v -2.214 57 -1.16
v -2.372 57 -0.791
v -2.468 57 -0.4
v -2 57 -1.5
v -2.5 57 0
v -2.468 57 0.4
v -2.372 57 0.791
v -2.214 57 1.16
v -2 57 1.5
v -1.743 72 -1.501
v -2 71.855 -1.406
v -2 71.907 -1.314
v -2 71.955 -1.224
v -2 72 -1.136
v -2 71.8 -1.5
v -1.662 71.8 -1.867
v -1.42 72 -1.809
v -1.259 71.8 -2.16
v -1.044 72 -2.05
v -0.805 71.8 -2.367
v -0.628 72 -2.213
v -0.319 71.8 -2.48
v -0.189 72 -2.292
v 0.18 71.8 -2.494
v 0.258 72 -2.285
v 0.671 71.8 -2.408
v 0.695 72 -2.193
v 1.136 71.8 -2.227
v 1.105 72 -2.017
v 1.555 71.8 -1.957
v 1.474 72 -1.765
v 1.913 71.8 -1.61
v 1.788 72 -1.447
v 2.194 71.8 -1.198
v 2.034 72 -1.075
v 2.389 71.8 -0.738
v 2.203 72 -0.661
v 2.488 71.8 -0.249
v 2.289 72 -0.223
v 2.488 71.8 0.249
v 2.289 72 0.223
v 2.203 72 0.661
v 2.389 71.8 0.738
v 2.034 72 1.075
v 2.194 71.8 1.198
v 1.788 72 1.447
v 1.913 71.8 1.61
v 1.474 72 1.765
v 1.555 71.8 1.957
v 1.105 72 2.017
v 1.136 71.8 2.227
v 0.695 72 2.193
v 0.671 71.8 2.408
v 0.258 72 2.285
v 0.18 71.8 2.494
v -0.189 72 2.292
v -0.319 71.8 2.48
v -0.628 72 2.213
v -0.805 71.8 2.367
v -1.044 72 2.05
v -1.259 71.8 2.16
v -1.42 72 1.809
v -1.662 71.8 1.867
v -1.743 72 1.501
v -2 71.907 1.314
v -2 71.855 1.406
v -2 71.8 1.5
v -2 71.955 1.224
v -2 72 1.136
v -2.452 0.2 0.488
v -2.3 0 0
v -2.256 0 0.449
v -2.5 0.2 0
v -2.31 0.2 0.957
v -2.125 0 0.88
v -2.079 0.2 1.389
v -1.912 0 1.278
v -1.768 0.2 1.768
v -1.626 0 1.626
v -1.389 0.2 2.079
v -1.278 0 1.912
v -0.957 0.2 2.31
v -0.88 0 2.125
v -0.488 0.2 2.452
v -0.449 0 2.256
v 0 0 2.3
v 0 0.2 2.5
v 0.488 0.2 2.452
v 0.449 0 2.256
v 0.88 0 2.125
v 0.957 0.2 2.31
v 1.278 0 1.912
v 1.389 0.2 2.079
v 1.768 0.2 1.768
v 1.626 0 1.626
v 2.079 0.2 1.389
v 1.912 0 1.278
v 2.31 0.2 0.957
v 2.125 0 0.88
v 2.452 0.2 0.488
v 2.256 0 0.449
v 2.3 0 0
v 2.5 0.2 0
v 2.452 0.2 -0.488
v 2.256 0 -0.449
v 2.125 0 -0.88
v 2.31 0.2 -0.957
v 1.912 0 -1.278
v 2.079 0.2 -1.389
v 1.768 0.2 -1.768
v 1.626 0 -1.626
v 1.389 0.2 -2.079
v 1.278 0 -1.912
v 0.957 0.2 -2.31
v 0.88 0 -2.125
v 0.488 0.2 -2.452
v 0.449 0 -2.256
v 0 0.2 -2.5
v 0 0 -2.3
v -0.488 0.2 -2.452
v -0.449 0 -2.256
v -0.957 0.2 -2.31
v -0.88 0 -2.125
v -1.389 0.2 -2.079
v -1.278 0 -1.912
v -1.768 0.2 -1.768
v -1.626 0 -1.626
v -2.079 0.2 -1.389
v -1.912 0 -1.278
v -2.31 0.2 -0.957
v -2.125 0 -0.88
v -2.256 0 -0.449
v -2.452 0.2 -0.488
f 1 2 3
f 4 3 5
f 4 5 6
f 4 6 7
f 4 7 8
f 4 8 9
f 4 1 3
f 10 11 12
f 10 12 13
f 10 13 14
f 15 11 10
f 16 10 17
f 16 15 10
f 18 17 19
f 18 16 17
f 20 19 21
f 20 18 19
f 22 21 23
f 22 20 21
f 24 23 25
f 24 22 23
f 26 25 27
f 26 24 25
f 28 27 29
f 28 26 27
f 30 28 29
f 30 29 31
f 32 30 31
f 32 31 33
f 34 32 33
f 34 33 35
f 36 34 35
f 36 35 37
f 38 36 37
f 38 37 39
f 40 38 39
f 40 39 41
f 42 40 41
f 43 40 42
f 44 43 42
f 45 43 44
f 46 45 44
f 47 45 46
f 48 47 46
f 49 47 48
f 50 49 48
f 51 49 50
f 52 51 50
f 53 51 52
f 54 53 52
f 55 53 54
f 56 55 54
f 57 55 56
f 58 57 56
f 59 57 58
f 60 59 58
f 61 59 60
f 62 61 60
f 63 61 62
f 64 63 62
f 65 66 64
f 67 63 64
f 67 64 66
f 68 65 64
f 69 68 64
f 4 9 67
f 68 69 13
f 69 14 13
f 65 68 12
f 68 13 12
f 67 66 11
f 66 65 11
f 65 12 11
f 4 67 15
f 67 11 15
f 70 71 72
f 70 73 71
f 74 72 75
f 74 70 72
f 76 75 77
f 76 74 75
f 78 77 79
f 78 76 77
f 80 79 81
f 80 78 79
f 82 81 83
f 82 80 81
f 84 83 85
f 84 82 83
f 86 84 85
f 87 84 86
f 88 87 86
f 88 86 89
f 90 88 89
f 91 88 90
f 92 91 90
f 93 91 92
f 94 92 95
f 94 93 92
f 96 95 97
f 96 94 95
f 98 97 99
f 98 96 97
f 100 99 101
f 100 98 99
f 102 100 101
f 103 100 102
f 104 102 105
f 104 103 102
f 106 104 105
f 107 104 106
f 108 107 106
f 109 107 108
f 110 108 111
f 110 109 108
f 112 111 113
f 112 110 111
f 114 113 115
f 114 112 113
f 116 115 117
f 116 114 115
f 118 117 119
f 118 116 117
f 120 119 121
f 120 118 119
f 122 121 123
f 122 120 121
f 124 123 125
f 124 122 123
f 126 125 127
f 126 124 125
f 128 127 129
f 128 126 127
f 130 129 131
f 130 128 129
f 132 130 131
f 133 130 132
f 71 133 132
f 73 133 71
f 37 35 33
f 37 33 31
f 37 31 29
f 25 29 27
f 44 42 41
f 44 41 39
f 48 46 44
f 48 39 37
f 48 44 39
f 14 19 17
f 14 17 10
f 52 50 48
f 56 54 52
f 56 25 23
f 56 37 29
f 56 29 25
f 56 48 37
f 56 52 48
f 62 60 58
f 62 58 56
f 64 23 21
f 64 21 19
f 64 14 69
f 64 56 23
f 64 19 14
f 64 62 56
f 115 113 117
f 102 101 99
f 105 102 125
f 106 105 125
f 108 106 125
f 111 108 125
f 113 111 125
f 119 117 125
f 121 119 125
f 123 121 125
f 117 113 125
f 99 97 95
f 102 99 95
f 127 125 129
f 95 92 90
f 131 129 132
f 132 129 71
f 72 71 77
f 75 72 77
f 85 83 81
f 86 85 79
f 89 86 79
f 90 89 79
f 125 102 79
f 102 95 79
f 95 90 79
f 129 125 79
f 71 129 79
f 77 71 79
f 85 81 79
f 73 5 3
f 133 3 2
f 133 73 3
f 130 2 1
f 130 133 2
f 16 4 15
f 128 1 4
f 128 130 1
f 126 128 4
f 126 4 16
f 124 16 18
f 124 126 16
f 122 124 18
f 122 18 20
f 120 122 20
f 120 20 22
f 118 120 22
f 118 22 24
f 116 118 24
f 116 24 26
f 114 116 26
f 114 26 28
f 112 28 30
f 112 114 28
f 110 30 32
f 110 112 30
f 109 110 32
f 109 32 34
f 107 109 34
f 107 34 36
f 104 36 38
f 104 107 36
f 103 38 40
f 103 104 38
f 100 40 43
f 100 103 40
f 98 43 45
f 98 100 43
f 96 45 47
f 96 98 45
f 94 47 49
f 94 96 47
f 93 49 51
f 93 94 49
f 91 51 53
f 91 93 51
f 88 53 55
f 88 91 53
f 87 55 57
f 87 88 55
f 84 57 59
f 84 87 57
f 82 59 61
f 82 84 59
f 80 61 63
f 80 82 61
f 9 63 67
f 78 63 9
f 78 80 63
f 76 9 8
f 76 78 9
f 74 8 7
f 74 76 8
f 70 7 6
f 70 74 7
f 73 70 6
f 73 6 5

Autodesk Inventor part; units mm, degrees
ref_plane "YZ Plane" through (0, 0, 0) normal (1, 0, 0) x (0, 1, 0)
ref_plane "XZ Plane" through (0, 0, 0) normal (0, 1, 0) x (-1, 0, 0)
ref_plane "XY Plane" through (0, 0, 0) normal (0, 0, 1) x (1, 0, 0)
sketch "Sketch1" plane through (0, 0, 0) normal (0, 1, 0) x (-1, 0, 0)
  circle A0 centre (0, 0) radius 2.5
  dimension "d0" = 5
extrude "Extrusion1" add sketch "Sketch1" along normal blind 72
sketch "Sketch2" plane through (0, 72, 0) normal (0, 1, 0) x (1, 0, 0)
  circle A0 centre (0, 0) radius 2.5 projected
  line L0 (-2, -1.5) -> (-2, 1.5)
  dimension "d3" = 2
extrude "Extrusion2" cut sketch "Sketch2" against normal blind 15 contours L0 A0 picked at (-2.0912, -0.3466)
chamfer "Chamfer1" distance 0.2 angle 45 1 edges at (2.5, 72, 0)
chamfer "Chamfer2" distance 0.2 angle 45 1 edges at (2.5, 0, 0)
properties part number "Stepper Shaft"
